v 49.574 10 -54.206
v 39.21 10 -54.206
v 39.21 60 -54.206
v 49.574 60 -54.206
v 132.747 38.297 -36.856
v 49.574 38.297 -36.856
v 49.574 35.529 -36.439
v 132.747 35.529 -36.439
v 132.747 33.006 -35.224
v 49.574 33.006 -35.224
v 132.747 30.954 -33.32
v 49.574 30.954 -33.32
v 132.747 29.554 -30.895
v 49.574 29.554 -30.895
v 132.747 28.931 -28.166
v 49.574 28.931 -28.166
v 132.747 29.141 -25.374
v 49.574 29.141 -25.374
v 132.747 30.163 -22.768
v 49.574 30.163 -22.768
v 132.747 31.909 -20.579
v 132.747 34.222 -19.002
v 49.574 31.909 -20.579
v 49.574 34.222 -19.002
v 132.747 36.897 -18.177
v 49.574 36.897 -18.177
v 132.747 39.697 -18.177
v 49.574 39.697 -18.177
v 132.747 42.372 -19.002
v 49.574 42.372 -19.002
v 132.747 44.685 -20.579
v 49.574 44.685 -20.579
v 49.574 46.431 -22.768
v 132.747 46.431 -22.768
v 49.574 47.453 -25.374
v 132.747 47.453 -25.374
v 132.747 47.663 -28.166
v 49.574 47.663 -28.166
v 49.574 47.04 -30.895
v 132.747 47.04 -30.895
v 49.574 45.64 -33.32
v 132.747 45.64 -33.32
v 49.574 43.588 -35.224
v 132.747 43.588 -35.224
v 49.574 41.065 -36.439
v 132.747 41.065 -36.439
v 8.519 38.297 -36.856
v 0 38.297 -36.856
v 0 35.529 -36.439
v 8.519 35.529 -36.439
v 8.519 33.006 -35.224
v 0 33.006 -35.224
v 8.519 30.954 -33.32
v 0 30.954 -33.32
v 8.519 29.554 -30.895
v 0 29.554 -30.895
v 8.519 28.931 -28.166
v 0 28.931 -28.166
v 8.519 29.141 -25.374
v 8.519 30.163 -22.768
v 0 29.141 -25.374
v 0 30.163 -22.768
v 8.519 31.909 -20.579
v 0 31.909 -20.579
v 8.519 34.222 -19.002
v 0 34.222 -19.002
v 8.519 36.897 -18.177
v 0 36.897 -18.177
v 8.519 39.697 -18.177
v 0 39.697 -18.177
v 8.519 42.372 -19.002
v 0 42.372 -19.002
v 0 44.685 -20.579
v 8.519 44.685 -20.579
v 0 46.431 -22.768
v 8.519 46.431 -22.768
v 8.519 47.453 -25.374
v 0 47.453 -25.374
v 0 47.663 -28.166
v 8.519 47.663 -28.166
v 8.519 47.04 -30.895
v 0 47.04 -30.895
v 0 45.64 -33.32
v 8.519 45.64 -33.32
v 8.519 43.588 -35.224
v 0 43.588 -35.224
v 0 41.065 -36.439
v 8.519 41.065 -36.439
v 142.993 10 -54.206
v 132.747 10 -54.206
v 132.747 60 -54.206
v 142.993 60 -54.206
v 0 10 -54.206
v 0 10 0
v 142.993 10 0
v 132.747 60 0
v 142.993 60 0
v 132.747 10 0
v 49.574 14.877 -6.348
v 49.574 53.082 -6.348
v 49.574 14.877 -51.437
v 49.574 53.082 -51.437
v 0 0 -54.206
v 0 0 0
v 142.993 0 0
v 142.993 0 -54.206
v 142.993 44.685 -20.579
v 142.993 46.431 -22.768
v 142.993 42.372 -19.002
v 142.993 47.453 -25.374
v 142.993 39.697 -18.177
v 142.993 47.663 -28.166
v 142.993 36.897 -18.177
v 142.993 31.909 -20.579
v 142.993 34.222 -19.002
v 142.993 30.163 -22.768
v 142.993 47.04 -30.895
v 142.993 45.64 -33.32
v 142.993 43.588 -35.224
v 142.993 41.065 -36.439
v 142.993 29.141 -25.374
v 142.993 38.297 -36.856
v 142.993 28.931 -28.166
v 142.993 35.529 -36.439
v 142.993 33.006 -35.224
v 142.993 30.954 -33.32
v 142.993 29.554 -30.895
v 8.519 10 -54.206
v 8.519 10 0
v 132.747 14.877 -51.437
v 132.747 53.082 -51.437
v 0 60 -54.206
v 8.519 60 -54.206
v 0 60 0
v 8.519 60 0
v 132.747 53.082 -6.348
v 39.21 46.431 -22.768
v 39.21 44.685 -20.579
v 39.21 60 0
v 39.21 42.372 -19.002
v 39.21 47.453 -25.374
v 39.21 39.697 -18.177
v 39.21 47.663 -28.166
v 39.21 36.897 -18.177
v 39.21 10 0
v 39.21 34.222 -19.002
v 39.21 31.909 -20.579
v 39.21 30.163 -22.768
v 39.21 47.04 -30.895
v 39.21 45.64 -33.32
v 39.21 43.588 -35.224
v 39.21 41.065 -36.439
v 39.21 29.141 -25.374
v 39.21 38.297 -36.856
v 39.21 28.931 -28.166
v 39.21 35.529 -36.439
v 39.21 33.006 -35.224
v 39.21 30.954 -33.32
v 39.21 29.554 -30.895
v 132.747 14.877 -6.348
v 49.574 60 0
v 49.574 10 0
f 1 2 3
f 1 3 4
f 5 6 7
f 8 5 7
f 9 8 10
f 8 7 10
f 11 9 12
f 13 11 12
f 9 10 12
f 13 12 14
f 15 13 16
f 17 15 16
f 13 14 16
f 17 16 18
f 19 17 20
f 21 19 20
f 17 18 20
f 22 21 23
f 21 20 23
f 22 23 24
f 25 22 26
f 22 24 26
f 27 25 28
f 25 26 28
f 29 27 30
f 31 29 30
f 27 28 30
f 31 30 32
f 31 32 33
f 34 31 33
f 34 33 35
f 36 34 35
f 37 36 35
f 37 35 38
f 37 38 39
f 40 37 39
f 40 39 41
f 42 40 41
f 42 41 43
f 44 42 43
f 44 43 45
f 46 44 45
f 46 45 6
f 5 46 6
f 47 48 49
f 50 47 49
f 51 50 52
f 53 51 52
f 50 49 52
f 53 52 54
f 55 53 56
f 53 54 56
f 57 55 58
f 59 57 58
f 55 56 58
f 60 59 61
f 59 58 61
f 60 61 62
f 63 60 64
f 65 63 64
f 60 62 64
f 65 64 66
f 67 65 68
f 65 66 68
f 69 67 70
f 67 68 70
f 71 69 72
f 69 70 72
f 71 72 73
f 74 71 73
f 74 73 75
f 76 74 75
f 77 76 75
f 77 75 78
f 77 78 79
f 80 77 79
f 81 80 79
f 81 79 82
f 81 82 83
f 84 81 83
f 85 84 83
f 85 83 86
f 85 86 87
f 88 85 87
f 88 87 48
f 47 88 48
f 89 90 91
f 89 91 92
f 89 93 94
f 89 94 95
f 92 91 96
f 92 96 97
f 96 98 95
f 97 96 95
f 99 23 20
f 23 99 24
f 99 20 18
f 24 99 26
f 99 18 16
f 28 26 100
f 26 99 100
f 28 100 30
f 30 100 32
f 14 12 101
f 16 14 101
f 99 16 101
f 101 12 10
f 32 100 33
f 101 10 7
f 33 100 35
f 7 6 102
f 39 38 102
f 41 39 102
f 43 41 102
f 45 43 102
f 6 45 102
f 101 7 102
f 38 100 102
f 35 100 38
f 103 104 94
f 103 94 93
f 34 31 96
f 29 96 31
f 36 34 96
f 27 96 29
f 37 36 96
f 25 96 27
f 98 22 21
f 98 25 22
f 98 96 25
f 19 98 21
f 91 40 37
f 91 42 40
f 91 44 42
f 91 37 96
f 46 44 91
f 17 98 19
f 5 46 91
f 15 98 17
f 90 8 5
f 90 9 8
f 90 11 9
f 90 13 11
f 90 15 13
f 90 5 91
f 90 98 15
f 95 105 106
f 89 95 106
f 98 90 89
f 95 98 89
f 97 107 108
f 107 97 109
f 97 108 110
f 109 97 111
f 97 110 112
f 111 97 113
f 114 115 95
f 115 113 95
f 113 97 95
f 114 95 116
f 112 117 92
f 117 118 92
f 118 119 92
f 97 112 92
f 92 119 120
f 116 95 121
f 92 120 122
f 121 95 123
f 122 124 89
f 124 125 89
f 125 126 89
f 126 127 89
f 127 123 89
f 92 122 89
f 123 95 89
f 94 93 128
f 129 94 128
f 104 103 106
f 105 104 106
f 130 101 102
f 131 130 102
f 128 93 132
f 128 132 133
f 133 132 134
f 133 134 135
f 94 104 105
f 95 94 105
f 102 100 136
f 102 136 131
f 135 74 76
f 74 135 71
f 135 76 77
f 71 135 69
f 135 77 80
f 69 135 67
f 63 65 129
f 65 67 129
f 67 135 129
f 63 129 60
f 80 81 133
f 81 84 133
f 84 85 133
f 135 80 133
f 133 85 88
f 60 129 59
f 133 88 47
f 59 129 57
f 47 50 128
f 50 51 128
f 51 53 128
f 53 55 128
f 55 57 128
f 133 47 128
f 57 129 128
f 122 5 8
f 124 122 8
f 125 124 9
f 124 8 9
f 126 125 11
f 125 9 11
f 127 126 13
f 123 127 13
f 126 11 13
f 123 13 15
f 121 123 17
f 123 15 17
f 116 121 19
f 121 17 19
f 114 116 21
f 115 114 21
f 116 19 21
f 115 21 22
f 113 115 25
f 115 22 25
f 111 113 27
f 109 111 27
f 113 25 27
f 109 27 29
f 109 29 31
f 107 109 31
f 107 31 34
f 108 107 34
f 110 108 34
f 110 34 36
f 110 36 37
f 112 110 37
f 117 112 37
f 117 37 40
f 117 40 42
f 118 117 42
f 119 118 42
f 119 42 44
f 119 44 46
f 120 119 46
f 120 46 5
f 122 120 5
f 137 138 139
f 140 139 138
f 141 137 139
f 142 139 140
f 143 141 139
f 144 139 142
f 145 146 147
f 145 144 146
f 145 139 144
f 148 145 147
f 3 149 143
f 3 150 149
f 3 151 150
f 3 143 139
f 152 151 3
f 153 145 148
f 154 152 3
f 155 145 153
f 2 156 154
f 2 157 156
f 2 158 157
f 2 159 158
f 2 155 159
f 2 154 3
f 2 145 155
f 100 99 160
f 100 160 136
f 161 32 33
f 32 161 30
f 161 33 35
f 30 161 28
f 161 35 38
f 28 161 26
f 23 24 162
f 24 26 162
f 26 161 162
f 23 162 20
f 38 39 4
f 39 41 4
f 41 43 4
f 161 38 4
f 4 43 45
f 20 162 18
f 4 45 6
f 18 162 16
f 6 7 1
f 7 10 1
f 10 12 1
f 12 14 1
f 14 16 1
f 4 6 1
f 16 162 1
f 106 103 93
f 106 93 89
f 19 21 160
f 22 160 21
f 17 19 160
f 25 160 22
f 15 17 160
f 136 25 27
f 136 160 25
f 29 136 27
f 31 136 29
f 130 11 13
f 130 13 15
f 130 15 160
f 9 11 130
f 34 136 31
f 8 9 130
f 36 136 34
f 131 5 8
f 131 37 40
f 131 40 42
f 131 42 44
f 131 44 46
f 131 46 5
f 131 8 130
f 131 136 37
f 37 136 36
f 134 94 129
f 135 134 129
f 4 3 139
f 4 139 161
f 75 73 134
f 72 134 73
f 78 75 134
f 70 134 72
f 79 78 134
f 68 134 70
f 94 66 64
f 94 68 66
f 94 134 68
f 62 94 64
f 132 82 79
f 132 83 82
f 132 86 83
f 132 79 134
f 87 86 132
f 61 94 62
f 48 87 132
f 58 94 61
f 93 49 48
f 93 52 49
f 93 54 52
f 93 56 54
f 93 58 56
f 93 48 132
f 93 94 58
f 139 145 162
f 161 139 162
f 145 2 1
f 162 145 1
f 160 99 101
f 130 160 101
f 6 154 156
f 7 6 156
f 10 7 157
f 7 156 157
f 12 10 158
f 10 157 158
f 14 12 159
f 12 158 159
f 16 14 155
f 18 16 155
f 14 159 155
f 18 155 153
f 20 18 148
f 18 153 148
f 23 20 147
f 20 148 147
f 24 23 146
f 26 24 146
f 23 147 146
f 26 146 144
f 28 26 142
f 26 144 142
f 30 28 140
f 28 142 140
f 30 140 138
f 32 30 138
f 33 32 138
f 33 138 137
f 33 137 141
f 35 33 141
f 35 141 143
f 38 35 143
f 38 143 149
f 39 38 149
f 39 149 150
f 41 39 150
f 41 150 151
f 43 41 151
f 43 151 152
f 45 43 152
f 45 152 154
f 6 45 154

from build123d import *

# Parameters (mm, degrees)
SKIZZE1_W                         = 142.992898016
SKIZZE1_H                         = 54.206458071
AUFSATZ_LINEAR_AUSTRAGEN1_DEPTH   = 10
SKIZZE2_W                         = 8.518727461
SKIZZE2_H                         = 54.206458071
AUFSATZ_LINEAR_AUSTRAGEN2_DEPTH   = 50
SKIZZE2_W_2                       = 10.24596455
AUFSATZ_LINEAR_AUSTRAGEN2_2_DEPTH = 50
SKIZZE3_W                         = 10.363422534
SKIZZE3_H                         = 54.206458071
AUFSATZ_LINEAR_AUSTRAGEN3_DEPTH   = 50
SKIZZE4_W                         = 45.089308898
SKIZZE4_H                         = 38.205008477
OPTIONAL_DEPTH                    = 83.173109
SKIZZE5_R                         = 9.391884554
SCHNITT_LINEAR_AUSTRAGEN1_DEPTH   = 142.992898


with BuildPart() as part:
    # Skizze1 → Aufsatz-Linear austragen1 (new body)
    with BuildSketch(Plane(origin=(0, 0, 0), x_dir=(1, 0, 0), z_dir=(0, 1, 0))):
        with Locations((71.496449008, 27.103229036)):
            Rectangle(SKIZZE1_W, SKIZZE1_H)
    extrude(amount=AUFSATZ_LINEAR_AUSTRAGEN1_DEPTH)


with BuildPart() as body_2:
    # Skizze2 → Aufsatz-Linear austragen2 (new body)
    with BuildSketch(Plane(origin=(0, 10, 0), x_dir=(1, 0, 0), z_dir=(0, 1, 0))):
        with Locations((4.259363731, 27.103229036)):
            Rectangle(SKIZZE2_W, SKIZZE2_H)
    extrude(amount=AUFSATZ_LINEAR_AUSTRAGEN2_DEPTH)


with BuildPart() as body_3:
    # Skizze2 → Aufsatz-Linear austragen2 2 (new body)
    with BuildSketch(Plane(origin=(0, 10, 0), x_dir=(1, 0, 0), z_dir=(0, 1, 0))):
        with Locations((137.869915741, 27.103229036)):
            Rectangle(SKIZZE2_W_2, SKIZZE2_H)
    extrude(amount=AUFSATZ_LINEAR_AUSTRAGEN2_2_DEPTH)


with BuildPart() as body_4:
    # Skizze3 → Aufsatz-Linear austragen3 (new body)
    with BuildSketch(Plane(origin=(0, 10, 0), x_dir=(1, 0, 0), z_dir=(0, 1, 0))):
        with Locations((44.392113152, 27.103229036)):
            Rectangle(SKIZZE3_W, SKIZZE3_H)
    extrude(amount=AUFSATZ_LINEAR_AUSTRAGEN3_DEPTH)


with BuildPart() as body_5:
    # Skizze4 → Optional (new body)
    with BuildSketch(Plane(origin=(49.573824419, 0, 0), x_dir=(0, 0, -1), z_dir=(1, 0, 0))):
        with Locations((28.892468722, 33.979452593)):
            Rectangle(SKIZZE4_W, SKIZZE4_H)
    extrude(amount=OPTIONAL_DEPTH)


with BuildPart() as schnitt_linear_austragen1_tool:
    # Skizze5 → Schnitt-Linear austragen1 (new body)
    with BuildSketch(Plane.ZY):
        with Locations(Location((-27.463964756, 38.296921572, 0), (0, 0, 180))):  # turned: the seam where the file's is
            Circle(SKIZZE5_R)
    extrude(amount=-SCHNITT_LINEAR_AUSTRAGEN1_DEPTH)


with BuildPart() as body_2_1:
    add(body_2.part)

    # Schnitt-Linear austragen1: cut by schnitt_linear_austragen1_tool
    add(schnitt_linear_austragen1_tool.part, mode=Mode.SUBTRACT)


with BuildPart() as body_3_1:
    add(body_3.part)

    # Schnitt-Linear austragen1: cut by schnitt_linear_austragen1_tool
    add(schnitt_linear_austragen1_tool.part, mode=Mode.SUBTRACT)


with BuildPart() as body_4_1:
    add(body_4.part)

    # Schnitt-Linear austragen1: cut by schnitt_linear_austragen1_tool
    add(schnitt_linear_austragen1_tool.part, mode=Mode.SUBTRACT)


with BuildPart() as body_5_1:
    add(body_5.part)

    # Schnitt-Linear austragen1: cut by schnitt_linear_austragen1_tool
    add(schnitt_linear_austragen1_tool.part, mode=Mode.SUBTRACT)


solid = Compound([part.part, body_2_1.part, body_3_1.part, body_4_1.part, body_5_1.part])
